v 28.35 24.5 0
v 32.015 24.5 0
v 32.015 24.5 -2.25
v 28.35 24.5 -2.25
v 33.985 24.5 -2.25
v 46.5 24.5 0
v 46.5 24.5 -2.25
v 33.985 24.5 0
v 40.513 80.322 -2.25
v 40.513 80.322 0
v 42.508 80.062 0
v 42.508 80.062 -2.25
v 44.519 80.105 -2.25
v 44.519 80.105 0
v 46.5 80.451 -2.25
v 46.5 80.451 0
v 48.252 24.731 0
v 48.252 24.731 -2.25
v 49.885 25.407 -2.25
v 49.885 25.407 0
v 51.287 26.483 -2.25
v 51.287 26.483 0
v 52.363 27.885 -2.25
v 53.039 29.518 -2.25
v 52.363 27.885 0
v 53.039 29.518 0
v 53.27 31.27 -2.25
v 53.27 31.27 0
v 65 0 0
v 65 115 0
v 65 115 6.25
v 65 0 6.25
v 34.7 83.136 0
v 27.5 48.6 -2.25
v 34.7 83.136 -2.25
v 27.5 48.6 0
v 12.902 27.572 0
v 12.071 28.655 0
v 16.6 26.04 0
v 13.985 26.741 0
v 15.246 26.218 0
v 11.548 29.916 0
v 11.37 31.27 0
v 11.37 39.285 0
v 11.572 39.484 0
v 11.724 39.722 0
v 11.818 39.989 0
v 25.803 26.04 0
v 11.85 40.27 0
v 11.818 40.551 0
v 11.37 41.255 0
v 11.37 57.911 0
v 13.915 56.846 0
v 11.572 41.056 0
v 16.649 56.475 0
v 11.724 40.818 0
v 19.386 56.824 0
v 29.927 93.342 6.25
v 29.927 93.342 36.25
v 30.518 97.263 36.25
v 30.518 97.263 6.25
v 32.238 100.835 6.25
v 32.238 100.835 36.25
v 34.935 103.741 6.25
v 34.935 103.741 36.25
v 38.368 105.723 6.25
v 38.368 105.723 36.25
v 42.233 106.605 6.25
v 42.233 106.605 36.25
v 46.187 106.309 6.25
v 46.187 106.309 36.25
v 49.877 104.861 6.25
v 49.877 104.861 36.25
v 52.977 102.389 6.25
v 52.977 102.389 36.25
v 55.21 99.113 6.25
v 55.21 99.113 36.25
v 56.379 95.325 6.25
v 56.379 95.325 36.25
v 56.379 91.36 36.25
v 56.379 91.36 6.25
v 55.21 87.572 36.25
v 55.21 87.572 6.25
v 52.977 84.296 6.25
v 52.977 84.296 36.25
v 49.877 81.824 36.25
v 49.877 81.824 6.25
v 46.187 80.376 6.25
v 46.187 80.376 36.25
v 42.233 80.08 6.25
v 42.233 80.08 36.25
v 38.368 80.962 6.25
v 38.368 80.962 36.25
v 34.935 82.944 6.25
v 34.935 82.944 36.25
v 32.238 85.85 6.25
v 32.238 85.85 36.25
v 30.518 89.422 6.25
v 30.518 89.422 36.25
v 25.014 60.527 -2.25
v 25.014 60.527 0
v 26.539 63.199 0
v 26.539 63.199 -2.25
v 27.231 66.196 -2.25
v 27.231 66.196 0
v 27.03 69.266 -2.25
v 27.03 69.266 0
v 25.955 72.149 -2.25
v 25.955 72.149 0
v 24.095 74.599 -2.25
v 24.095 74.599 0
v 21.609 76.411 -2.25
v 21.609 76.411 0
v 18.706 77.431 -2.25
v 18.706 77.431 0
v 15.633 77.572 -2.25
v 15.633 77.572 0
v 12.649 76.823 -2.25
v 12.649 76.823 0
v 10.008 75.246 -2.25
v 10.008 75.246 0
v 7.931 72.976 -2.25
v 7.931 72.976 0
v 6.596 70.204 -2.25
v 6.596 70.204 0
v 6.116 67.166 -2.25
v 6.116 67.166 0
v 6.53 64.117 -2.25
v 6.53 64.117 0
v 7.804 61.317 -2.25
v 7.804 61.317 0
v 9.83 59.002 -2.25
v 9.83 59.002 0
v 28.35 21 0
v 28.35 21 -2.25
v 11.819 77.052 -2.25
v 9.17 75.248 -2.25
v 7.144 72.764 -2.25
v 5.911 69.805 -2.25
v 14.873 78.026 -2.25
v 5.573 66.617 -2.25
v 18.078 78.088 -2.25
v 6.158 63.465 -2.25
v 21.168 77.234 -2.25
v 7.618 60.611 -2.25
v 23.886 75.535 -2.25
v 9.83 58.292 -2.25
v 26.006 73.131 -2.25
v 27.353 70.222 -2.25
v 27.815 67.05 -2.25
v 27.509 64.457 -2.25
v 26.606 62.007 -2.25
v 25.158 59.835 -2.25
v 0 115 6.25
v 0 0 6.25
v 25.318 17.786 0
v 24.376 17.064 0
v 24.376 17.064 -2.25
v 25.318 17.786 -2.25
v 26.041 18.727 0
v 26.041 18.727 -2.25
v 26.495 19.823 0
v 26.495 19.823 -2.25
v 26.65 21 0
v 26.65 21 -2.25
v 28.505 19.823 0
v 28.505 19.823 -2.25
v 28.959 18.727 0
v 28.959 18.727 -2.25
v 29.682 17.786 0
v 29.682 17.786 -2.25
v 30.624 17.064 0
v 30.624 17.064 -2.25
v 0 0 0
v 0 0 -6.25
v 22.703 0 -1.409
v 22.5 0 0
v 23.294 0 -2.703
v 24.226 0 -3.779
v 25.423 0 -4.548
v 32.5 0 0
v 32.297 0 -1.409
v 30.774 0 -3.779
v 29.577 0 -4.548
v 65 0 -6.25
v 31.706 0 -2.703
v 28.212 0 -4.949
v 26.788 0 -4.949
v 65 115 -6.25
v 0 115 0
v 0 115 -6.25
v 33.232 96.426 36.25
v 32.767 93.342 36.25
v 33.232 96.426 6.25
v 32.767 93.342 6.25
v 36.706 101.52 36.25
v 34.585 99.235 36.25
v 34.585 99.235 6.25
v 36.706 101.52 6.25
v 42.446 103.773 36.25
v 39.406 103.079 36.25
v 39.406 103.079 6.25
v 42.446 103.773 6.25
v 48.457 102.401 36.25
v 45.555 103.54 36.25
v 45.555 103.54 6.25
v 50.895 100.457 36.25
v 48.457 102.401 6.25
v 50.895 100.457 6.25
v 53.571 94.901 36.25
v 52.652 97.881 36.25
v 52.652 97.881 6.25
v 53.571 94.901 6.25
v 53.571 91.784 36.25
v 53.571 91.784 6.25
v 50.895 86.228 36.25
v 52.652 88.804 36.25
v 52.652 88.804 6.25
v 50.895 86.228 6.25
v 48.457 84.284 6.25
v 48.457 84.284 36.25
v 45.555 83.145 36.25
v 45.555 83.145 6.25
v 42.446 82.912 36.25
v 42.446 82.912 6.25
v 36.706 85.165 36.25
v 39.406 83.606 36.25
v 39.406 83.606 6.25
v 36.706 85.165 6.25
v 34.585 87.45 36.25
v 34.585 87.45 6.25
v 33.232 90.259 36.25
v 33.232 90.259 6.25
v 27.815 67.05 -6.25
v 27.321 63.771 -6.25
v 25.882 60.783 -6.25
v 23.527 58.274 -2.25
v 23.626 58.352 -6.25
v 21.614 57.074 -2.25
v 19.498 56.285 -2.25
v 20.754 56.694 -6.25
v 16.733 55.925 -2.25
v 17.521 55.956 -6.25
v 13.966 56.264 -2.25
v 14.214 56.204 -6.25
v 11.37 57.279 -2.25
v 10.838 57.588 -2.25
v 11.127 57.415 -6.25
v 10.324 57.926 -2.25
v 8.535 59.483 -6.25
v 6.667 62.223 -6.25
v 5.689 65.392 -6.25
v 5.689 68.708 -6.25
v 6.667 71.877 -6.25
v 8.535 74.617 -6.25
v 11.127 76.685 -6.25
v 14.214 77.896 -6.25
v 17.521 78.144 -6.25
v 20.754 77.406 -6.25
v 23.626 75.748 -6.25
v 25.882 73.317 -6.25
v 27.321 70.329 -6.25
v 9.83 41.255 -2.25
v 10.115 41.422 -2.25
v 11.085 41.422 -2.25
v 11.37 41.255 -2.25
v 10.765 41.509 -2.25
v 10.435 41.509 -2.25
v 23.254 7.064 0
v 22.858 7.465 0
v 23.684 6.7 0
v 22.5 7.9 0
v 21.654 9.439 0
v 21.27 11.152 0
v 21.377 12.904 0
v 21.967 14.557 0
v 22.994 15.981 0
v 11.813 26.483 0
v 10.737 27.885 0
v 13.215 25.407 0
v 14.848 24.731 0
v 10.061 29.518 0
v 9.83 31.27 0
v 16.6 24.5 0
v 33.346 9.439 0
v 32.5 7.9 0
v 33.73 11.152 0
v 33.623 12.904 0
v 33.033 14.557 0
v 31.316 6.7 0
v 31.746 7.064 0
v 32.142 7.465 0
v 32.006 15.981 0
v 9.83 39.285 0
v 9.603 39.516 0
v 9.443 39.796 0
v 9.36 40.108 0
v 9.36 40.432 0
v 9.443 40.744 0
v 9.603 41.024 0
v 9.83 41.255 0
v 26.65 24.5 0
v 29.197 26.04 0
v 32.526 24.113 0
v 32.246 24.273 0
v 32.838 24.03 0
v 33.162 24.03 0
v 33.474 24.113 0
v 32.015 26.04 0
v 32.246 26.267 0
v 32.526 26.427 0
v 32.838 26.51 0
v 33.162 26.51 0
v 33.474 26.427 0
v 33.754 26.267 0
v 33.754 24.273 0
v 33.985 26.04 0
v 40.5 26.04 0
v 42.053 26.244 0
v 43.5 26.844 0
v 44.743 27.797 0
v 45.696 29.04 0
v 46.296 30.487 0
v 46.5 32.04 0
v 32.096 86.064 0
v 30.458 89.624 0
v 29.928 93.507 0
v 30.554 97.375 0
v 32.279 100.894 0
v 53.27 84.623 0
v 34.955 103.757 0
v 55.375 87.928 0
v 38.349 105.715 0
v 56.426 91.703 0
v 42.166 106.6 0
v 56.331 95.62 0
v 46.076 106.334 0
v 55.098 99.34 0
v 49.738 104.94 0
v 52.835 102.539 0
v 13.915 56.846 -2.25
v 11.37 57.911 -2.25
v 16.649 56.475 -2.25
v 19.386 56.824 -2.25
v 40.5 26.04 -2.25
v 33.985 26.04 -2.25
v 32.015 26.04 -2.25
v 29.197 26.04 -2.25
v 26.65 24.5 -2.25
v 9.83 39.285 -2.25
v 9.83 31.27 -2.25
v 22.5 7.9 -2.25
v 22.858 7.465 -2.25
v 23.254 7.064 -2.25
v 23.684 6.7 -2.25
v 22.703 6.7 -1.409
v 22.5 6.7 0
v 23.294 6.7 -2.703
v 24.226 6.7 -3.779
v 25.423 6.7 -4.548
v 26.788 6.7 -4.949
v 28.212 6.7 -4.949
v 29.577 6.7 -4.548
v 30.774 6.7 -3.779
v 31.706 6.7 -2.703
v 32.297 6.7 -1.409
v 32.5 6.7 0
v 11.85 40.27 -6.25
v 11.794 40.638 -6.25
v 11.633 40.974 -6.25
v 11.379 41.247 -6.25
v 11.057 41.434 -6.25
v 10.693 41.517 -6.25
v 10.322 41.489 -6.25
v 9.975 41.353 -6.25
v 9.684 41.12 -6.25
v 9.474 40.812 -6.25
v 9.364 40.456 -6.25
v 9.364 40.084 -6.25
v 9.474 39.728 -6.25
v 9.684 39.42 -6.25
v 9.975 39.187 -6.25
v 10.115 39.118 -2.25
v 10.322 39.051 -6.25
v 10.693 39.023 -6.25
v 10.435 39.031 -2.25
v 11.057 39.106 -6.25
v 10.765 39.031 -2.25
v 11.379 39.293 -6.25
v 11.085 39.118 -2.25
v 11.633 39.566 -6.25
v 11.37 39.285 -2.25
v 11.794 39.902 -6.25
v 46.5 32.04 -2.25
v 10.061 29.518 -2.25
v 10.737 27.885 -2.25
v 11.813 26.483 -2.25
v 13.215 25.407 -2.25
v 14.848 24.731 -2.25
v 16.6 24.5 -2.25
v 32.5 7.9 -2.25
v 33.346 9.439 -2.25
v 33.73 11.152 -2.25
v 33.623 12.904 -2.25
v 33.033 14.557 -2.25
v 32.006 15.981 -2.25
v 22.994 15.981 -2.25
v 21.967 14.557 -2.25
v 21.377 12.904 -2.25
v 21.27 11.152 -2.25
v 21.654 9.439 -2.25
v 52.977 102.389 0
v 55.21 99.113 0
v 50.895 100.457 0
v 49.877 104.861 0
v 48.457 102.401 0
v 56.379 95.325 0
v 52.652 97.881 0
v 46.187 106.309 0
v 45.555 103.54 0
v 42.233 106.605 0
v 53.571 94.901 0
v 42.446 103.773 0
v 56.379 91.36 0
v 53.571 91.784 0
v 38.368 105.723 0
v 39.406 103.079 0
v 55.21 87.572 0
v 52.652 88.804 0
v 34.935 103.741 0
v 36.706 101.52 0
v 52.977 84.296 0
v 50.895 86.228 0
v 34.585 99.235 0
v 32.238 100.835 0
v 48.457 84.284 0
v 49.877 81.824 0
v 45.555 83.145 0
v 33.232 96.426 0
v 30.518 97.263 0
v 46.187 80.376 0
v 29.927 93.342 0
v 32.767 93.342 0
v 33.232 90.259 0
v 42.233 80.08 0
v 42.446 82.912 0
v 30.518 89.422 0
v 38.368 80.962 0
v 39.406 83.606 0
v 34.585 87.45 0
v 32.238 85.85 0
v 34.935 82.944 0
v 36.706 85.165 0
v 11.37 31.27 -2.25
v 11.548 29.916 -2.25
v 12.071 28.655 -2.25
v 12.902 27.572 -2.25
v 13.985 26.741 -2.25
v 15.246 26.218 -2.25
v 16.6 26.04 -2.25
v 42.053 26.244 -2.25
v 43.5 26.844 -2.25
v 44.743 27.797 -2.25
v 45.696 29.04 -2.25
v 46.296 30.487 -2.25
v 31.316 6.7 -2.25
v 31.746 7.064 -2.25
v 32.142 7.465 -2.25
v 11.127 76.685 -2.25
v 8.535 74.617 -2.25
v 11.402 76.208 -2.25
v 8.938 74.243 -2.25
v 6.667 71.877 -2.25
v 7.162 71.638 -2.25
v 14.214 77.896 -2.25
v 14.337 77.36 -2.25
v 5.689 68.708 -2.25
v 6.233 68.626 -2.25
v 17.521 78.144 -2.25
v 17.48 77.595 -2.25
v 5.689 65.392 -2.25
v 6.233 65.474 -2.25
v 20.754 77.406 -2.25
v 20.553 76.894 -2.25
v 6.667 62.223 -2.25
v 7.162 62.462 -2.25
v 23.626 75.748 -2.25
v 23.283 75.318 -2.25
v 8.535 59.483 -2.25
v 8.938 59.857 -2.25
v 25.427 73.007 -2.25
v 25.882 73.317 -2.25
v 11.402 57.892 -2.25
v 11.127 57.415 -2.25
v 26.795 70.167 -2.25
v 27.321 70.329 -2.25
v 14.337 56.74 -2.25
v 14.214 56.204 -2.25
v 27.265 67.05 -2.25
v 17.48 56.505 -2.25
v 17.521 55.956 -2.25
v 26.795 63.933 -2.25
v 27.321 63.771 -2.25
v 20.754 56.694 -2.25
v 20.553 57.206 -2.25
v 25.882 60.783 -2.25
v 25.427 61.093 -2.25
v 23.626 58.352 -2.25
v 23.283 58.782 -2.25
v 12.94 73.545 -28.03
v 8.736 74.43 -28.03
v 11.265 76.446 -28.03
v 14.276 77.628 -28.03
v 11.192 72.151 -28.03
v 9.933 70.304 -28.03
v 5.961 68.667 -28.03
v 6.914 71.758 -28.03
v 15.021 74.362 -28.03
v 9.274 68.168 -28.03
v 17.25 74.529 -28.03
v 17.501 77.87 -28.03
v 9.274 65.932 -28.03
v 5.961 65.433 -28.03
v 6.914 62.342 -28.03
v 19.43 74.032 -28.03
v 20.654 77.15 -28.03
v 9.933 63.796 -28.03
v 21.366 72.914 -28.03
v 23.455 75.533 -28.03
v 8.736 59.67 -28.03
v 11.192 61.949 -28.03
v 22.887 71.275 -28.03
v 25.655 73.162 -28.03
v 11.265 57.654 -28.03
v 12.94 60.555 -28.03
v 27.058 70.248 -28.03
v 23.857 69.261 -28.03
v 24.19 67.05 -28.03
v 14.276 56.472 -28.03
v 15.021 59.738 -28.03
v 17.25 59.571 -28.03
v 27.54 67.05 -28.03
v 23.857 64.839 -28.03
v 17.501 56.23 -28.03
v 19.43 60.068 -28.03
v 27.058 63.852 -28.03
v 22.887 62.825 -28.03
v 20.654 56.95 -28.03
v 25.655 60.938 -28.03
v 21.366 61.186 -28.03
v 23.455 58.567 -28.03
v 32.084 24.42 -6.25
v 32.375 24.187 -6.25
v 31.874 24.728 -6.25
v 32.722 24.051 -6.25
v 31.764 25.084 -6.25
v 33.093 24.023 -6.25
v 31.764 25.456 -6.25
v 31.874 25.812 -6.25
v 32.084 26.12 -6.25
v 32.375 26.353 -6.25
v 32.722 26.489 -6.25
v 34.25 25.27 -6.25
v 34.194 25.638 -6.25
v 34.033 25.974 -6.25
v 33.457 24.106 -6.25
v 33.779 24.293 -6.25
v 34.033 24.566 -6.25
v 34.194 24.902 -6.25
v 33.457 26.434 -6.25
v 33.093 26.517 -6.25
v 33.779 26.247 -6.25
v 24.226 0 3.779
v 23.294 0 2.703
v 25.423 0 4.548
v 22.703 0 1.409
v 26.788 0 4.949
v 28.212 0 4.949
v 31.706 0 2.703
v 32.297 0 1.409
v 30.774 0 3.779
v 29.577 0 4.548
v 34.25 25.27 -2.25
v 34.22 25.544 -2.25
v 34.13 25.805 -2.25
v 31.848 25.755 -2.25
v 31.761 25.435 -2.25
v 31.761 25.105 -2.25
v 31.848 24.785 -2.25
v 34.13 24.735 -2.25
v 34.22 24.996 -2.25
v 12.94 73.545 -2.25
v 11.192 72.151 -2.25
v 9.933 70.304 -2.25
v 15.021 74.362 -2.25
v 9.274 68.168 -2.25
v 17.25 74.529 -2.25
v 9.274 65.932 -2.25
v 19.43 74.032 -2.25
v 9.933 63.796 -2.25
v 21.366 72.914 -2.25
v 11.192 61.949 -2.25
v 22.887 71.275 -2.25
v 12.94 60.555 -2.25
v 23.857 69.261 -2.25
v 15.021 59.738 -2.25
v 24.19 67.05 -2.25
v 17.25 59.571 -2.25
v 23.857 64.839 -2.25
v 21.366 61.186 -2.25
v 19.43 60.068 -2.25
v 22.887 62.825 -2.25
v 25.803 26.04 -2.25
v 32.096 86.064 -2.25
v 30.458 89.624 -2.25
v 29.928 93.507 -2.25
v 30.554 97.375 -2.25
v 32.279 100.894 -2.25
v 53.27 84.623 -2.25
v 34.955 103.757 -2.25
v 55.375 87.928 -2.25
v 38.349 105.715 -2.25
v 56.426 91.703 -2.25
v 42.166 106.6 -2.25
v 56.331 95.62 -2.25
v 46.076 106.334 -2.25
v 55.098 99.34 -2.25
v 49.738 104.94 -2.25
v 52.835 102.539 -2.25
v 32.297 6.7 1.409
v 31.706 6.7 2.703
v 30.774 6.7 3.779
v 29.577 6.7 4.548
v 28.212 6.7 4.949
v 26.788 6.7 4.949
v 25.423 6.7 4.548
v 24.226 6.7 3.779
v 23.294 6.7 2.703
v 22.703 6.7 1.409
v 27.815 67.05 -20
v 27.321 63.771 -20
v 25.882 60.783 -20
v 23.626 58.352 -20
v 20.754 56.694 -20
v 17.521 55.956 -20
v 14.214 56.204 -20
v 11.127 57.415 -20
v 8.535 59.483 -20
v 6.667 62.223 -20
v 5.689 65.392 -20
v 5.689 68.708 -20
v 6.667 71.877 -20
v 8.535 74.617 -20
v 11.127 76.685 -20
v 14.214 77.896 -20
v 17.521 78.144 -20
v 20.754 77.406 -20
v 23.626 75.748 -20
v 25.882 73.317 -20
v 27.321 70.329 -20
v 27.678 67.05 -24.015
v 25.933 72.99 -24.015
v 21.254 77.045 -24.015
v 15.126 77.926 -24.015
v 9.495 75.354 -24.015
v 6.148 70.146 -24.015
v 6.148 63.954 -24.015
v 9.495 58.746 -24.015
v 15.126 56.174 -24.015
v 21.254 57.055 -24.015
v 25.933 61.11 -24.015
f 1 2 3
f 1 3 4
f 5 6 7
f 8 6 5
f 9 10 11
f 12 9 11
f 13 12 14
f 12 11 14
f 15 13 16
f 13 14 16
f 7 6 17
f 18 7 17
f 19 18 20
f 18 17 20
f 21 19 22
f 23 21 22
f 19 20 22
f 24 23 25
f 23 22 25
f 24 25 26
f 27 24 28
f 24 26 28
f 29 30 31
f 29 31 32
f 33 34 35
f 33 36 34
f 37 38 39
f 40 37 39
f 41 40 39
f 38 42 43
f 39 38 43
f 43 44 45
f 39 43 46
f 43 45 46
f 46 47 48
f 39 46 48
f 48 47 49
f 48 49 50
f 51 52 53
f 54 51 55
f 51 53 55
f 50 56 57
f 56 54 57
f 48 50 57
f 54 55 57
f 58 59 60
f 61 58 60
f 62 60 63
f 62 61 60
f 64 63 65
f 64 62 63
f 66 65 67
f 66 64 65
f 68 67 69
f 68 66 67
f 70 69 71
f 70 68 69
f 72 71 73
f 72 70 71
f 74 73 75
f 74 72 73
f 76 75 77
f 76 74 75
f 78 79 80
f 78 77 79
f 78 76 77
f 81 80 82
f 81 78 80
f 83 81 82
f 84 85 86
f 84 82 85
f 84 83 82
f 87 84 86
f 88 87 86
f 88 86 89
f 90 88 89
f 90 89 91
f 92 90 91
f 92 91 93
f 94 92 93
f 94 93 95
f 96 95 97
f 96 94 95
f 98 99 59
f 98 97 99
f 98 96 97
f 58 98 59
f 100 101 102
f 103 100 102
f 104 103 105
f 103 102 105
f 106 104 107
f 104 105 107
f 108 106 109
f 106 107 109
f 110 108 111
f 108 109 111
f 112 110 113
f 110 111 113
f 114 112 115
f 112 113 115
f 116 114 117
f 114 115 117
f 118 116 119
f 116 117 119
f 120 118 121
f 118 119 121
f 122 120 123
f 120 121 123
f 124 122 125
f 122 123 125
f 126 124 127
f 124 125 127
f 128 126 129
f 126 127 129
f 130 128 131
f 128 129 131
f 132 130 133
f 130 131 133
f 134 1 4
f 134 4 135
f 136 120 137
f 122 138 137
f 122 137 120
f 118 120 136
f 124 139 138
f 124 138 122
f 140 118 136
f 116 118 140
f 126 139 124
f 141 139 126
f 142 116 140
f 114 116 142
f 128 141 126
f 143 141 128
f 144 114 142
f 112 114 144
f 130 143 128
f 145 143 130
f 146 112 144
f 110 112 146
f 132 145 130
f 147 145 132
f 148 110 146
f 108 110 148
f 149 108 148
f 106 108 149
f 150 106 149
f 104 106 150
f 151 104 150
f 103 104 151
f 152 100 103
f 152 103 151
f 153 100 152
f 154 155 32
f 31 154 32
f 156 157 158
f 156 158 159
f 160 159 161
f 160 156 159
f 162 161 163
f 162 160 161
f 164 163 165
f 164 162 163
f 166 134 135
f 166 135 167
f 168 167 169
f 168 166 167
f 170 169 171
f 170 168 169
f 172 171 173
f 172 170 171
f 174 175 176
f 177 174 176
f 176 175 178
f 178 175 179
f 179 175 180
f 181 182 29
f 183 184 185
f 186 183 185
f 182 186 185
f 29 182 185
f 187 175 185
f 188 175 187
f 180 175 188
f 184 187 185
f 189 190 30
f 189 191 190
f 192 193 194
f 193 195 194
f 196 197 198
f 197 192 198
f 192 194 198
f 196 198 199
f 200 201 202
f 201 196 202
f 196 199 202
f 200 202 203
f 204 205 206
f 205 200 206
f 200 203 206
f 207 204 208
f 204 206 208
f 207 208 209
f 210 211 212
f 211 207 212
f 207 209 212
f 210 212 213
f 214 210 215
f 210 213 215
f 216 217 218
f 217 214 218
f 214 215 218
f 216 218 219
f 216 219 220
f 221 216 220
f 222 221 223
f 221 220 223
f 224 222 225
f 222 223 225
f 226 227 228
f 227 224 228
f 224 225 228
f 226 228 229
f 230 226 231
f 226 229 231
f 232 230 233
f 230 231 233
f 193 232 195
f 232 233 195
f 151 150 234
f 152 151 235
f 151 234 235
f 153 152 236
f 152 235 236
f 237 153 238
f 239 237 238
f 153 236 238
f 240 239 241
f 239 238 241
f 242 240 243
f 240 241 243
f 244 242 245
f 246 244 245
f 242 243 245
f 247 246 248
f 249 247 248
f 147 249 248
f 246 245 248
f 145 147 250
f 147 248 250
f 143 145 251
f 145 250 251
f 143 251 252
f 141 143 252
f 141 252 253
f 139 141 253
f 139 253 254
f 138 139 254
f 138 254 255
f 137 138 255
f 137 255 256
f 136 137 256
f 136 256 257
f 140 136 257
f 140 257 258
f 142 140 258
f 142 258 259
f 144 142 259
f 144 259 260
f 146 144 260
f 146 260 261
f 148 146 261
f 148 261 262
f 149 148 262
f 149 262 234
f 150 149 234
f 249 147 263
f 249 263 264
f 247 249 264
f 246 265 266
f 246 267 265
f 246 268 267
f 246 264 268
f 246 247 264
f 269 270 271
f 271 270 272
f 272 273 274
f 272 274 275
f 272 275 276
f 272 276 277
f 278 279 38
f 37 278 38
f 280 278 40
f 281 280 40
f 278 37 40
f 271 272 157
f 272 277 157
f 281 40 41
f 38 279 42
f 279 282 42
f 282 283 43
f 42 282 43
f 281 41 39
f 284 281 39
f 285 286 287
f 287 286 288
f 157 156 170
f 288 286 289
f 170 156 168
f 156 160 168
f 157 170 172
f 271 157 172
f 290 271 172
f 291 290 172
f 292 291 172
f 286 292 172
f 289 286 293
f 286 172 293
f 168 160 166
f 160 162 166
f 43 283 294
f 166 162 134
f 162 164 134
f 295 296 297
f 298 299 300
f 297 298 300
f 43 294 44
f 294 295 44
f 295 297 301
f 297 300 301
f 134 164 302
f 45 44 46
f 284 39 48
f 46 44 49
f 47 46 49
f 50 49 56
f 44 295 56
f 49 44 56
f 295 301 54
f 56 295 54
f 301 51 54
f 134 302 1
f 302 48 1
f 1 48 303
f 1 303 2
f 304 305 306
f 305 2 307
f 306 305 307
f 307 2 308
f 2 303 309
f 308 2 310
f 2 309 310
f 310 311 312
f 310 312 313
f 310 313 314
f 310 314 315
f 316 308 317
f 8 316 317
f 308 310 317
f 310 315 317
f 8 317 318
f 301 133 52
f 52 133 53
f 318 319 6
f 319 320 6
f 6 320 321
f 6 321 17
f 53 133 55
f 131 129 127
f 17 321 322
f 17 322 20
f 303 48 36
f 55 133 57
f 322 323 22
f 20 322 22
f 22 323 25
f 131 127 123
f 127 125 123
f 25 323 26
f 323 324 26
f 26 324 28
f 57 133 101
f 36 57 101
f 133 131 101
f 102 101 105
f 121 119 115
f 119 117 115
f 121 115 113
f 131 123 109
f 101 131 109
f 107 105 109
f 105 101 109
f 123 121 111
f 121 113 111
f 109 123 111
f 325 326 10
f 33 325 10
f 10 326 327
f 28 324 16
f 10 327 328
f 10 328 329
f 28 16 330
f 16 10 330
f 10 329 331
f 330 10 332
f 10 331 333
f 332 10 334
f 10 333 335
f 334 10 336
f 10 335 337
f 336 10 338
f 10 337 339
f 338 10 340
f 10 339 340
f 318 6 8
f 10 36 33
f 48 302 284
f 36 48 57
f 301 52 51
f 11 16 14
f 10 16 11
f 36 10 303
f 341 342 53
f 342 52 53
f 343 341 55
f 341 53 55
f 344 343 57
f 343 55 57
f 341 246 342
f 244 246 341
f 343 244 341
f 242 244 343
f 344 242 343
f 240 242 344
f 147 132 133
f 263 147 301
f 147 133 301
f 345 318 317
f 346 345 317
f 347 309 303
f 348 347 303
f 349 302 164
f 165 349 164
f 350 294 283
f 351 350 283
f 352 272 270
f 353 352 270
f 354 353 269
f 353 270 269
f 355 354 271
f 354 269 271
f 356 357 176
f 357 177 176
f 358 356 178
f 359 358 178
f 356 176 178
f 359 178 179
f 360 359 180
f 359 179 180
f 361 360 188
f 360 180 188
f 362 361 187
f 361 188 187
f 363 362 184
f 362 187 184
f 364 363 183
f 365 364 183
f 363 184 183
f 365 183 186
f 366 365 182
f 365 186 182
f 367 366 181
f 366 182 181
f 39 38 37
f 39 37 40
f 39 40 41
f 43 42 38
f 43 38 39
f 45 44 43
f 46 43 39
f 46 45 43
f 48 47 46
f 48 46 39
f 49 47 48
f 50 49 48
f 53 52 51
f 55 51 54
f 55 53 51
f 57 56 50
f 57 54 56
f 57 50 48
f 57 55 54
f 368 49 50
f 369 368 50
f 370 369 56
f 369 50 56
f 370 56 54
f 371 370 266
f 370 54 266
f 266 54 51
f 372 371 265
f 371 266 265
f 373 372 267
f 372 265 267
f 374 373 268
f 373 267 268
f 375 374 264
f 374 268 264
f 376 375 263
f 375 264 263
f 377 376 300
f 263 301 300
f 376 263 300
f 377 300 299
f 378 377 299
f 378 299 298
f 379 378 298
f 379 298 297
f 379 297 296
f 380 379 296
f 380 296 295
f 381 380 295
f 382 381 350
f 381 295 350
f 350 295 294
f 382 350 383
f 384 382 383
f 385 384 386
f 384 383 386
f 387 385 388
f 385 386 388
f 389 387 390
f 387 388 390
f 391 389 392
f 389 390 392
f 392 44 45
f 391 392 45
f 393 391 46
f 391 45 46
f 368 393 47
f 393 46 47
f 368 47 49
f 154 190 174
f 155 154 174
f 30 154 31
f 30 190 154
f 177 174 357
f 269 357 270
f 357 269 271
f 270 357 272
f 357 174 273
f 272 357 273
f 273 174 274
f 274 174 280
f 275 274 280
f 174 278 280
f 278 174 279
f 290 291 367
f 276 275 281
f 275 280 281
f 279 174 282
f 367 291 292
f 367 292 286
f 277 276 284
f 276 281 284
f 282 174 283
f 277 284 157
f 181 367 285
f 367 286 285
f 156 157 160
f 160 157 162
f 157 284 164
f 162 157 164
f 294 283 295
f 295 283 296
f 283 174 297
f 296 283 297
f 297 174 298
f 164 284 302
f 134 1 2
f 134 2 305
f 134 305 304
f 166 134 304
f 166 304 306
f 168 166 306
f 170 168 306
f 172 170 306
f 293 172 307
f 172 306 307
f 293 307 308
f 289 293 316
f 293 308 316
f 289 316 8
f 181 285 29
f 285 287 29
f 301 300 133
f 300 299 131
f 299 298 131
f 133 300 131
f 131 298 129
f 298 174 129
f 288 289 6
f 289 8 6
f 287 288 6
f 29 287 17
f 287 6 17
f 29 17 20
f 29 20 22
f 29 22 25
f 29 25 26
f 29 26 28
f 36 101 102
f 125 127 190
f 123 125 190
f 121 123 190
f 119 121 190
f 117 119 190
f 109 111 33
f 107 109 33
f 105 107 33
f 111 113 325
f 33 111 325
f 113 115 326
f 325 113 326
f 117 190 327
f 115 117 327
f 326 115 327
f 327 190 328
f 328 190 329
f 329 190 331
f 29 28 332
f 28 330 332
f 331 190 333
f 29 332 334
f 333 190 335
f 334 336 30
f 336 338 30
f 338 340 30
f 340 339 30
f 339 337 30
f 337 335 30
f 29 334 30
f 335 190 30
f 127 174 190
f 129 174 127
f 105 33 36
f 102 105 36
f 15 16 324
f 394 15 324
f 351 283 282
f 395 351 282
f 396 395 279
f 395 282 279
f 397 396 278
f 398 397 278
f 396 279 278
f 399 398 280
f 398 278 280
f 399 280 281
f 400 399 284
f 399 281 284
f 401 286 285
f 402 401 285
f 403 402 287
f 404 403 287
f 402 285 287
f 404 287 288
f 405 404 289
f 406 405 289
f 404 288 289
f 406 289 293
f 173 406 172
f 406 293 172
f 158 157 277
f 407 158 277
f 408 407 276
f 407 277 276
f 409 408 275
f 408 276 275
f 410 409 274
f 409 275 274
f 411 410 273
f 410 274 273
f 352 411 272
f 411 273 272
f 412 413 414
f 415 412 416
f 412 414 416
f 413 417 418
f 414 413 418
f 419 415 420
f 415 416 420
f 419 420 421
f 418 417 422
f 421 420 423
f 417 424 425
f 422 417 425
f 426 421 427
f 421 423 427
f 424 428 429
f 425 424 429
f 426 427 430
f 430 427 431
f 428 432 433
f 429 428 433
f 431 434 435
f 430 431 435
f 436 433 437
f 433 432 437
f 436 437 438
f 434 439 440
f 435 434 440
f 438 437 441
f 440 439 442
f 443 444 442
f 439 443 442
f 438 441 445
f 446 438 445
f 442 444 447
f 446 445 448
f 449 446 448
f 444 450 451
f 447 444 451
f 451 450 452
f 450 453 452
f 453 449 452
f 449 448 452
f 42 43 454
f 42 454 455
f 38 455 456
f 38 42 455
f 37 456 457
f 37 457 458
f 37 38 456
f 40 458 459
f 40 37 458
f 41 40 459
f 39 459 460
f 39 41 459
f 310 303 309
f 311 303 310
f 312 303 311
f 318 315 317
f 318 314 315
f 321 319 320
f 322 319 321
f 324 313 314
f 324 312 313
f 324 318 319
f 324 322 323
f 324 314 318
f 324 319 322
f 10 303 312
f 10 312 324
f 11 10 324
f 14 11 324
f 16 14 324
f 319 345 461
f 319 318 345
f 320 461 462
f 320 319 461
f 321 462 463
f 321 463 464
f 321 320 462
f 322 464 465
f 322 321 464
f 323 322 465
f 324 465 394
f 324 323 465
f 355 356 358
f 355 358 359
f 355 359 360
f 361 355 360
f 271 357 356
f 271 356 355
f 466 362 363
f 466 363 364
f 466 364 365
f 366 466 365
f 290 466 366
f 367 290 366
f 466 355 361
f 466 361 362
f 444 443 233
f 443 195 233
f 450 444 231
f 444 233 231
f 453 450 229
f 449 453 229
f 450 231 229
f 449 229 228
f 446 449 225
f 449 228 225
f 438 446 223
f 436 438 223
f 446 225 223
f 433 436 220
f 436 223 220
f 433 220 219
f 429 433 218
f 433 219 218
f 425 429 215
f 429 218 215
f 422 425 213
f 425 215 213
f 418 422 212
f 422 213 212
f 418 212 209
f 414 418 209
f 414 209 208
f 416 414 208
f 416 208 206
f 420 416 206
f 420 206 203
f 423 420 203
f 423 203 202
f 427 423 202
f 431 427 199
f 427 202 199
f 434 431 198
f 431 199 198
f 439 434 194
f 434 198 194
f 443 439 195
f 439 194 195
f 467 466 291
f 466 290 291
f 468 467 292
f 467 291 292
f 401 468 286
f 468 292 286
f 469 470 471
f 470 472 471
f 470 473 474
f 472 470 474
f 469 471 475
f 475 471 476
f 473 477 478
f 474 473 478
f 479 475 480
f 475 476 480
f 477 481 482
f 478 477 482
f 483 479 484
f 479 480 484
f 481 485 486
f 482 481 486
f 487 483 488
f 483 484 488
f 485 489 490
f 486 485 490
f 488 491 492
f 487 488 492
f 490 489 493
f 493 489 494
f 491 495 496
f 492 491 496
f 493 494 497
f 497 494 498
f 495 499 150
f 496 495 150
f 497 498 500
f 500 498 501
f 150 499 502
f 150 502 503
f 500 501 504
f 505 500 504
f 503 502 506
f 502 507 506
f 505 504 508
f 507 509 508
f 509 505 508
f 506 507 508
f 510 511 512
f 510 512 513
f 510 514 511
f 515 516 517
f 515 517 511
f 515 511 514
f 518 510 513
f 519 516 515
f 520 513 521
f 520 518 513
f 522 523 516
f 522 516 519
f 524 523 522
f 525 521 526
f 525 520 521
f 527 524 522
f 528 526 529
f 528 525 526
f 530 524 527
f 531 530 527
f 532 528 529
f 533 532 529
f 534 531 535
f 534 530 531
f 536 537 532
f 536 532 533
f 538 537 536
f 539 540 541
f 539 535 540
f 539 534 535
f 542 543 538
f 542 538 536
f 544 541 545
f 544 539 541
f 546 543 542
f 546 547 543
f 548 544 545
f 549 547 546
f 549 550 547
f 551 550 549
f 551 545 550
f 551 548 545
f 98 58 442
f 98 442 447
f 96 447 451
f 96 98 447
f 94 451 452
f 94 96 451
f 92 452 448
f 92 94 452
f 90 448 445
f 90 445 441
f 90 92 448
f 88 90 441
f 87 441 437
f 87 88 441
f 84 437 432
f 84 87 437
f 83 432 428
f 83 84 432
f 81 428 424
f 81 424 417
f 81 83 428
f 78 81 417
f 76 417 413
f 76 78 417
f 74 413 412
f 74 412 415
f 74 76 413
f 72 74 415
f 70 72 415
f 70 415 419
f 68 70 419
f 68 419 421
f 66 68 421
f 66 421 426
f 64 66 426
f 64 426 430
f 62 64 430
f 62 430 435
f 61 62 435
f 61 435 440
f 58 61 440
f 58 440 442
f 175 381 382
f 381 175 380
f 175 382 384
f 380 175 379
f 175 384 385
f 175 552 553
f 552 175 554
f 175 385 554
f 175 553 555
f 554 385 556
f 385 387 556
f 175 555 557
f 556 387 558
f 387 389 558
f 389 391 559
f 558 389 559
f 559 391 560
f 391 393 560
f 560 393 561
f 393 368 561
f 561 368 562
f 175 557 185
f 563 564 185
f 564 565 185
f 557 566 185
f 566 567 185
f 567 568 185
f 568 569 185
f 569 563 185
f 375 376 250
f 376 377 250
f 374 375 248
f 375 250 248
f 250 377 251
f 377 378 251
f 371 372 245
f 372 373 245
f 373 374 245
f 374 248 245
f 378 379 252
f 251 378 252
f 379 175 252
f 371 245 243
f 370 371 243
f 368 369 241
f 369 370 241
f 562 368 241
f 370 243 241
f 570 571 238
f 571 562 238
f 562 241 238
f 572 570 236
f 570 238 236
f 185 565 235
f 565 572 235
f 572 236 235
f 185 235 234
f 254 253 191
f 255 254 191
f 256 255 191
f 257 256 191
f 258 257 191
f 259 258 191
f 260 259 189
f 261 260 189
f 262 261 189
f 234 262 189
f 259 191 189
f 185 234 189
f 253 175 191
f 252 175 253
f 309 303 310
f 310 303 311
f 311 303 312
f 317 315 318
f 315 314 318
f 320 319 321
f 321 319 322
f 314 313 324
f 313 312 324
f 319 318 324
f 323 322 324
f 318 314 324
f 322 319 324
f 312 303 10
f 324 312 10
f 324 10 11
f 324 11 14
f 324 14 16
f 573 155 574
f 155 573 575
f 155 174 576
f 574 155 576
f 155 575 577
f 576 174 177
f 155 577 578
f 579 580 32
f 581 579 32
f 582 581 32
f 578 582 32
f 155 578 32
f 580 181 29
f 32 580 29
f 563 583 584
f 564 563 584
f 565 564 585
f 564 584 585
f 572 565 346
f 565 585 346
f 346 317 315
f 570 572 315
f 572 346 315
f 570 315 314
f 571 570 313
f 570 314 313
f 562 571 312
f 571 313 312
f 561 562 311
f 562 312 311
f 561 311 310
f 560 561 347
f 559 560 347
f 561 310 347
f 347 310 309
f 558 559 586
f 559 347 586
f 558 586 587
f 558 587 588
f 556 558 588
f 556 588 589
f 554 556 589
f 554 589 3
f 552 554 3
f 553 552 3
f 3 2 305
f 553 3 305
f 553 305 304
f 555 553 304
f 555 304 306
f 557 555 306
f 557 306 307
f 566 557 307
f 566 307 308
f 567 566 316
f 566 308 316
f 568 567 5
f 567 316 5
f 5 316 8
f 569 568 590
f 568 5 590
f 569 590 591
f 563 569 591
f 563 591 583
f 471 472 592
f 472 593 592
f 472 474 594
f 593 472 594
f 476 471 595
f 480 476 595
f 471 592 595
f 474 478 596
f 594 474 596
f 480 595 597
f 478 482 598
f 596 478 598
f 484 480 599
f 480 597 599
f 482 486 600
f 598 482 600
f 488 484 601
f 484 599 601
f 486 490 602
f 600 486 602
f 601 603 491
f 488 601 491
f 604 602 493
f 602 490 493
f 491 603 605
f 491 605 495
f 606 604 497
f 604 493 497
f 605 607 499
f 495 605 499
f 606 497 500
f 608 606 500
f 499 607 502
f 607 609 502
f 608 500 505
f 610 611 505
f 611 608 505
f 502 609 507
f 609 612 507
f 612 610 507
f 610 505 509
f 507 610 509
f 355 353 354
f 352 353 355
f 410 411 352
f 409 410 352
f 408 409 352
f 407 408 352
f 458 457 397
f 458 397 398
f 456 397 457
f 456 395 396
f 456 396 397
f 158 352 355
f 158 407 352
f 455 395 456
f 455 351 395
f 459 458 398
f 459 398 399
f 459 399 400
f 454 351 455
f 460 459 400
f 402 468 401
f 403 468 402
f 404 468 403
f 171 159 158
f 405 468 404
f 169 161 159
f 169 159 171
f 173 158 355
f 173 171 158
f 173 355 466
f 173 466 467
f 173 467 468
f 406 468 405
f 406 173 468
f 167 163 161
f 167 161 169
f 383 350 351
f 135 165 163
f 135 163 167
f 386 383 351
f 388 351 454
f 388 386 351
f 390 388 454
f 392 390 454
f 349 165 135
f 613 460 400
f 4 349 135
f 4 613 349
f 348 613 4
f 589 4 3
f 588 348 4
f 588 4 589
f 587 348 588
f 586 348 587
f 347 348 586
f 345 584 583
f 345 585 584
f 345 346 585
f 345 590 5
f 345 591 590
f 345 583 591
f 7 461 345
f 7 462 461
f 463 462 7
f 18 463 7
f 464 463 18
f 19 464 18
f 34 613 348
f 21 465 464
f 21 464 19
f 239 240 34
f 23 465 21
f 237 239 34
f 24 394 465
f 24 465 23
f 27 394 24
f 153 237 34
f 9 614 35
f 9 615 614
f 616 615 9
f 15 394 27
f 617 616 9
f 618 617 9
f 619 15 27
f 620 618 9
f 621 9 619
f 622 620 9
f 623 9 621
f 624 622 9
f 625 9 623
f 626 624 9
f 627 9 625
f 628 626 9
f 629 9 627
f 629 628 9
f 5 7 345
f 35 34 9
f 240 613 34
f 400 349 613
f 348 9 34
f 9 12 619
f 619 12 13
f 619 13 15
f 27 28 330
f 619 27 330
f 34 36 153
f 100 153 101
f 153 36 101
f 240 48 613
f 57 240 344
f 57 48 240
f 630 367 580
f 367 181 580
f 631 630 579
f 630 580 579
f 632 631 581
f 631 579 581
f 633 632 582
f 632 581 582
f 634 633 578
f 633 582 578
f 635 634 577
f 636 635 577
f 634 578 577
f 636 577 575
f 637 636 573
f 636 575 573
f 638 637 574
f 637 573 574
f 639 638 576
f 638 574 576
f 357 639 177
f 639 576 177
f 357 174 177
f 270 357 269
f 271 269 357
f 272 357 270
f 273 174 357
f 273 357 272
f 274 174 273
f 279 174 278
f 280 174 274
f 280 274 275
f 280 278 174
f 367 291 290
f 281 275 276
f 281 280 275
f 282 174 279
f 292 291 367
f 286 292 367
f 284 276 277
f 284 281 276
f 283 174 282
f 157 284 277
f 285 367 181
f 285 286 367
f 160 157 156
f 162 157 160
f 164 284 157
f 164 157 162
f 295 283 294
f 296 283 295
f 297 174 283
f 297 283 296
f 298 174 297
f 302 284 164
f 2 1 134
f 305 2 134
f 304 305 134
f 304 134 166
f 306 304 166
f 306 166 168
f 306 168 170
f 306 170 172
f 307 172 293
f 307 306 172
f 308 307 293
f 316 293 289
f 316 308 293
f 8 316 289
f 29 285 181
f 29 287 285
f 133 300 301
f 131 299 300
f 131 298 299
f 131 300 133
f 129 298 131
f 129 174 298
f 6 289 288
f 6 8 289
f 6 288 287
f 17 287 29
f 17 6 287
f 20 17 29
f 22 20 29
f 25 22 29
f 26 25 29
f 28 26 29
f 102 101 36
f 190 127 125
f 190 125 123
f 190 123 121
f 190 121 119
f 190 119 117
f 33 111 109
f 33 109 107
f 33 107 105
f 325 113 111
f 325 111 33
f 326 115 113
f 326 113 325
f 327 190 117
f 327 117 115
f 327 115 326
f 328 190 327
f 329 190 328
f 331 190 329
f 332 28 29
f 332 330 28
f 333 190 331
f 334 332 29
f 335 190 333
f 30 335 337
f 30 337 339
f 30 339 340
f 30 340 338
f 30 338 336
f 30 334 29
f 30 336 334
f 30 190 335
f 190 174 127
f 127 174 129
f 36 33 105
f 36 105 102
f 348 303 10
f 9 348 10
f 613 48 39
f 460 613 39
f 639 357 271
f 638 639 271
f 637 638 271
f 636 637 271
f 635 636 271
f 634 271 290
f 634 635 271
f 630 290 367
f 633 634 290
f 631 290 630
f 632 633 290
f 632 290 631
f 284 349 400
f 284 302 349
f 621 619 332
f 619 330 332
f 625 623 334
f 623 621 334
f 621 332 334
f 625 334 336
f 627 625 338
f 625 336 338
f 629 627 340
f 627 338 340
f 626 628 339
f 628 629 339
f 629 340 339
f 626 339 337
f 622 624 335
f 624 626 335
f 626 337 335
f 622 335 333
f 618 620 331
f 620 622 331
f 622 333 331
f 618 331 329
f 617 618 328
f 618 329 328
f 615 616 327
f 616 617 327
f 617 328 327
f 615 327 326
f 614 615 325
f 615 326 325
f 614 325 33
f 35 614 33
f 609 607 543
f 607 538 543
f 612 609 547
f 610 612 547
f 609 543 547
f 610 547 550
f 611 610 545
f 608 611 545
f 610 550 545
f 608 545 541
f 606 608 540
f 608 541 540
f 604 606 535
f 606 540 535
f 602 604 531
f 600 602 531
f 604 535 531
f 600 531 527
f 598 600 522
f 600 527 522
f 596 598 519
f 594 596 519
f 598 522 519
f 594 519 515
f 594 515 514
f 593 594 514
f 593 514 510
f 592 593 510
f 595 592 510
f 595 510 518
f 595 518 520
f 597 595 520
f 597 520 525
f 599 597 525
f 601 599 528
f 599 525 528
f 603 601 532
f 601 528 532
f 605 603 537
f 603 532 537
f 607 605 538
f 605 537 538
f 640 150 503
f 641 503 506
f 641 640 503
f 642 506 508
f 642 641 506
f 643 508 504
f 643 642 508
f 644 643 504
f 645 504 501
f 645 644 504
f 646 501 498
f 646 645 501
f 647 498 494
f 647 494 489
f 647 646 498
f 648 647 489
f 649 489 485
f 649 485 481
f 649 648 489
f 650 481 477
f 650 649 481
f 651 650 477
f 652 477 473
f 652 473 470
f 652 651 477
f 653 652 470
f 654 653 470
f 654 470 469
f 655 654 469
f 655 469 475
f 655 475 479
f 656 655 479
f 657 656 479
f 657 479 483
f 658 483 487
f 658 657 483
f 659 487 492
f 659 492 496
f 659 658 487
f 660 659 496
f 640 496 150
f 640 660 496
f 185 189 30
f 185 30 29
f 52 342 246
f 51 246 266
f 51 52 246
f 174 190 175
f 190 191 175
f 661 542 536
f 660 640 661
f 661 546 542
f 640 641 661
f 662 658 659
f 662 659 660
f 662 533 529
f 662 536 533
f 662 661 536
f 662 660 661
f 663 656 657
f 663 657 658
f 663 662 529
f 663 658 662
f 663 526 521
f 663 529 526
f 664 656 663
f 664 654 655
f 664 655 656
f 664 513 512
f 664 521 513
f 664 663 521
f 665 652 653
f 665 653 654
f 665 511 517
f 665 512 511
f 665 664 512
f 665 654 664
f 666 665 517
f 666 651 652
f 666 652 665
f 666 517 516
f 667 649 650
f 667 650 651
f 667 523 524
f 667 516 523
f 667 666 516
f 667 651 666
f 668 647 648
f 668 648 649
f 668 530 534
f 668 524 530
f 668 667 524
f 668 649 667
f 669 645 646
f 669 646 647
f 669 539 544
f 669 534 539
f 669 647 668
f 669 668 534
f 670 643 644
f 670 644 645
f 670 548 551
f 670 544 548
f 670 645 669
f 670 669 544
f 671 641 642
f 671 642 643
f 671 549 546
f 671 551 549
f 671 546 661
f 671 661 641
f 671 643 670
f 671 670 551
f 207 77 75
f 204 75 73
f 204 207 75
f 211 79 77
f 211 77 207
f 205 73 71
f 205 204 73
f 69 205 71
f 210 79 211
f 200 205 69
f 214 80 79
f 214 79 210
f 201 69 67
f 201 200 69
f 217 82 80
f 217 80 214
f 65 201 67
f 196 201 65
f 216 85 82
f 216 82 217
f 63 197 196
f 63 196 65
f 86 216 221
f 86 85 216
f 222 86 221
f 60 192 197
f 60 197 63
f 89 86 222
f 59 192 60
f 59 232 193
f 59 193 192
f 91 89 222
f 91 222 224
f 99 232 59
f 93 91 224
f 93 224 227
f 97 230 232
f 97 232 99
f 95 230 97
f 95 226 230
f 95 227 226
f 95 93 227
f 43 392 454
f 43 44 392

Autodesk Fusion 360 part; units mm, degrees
sketch "Channels" plane through (0, 0, 0) normal (0, 0, 1) x (1, 0, 0)
  line L0 (0, 0) -> (46.5, 0)
  line L1 (46.5, 0) -> (46.5, 83) construction
  line L2 (46.5, 83) -> (0, 83) construction
  line L3 (0, 83) -> (0, 0)
  line L4 (27.5, -7) -> (27.5, 90) construction
  line L5 (10.6, 83) -> (10.6, 31.27) construction
  line L6 (46.5, 25.27) -> (16.6, 25.27) construction
  arc A0 (10.6, 31.27) -> (16.6, 25.27) centre (16.6, 31.27) ccw construction
  arc A1 (9.83, 31.27) -> (16.6, 24.5) centre (16.6, 31.27) ccw
  arc A2 (11.37, 31.27) -> (16.6, 26.04) centre (16.6, 31.27) ccw
  line L7 (27.5, 48.6) -> (34.6997, 83.1362)
  line L8 (27.5, 48.6) -> (46.5, 48.6) construction
  line L9 (27.5, 48.6) -> (25.0136, 60.5271)
  line L10 (25.8031, 26.04) -> (19.3855, 56.8243)
  line L11 (27.5, 17.9) -> (28.8759, 24.5) construction
  line L12 (29.1969, 26.04) -> (33.9, 48.6) construction
  line L13 (28.35, 24.5) -> (28.35, 21)
  line L14 (26.65, 24.5) -> (26.65, 21)
  arc A3 (28.35, 21) -> (30.6235, 17.0635) centre (32.8947, 21) ccw
  arc A4 (24.3765, 17.0635) -> (26.65, 21) centre (22.1053, 21) ccw
  line L15 (40.5, 26.04) -> (29.1969, 26.04)
  line L16 (25.8031, 26.04) -> (16.6, 26.04)
  line L17 (46.5, 24.5) -> (28.35, 24.5)
  line L18 (26.65, 24.5) -> (16.6, 24.5)
  line L19 (11.37, 57.9106) -> (11.37, 31.27)
  line L20 (9.83, 59.002) -> (9.83, 31.27)
  arc A5 (25.0136, 60.5271) -> (9.83, 59.002) centre (16.69, 67.05) ccw
  arc A6 (11.37, 57.9106) -> (19.3855, 56.8243) centre (16.69, 67.05) ccw
  circle A7 centre (16.69, 67.05) radius 7.5 construction
  line L21 (32.5, 0) -> (32.5, 7.9)
  line L22 (22.5, 0) -> (22.5, 7.9)
  arc A8 (24.3766, 17.0636) -> (22.5, 7.9) centre (27.5, 11.65) ccw
  arc A9 (22.5, 7.9) -> (27.5, 5.4) centre (27.5, 11.65) ccw construction
  arc A10 (27.5, 5.4) -> (32.5, 7.9) centre (27.5, 11.65) ccw construction
  arc A11 (32.5, 7.9) -> (30.6235, 17.0635) centre (27.5, 11.65) ccw
  line L23 (29.1969, 26.04) -> (40.5131, 80.3225)
  line L24 (40.5131, 80.3225) -> (44.213, 98.0704) construction
  line L25 (34.6997, 83.1362) -> (34.6713, 83) construction
  arc A12 (30.6235, 17.0635) -> (27.5, 17.9) centre (27.5, 11.65) ccw construction
  arc A13 (24.3765, 17.0635) -> (30.6235, 17.0635) centre (27.5, 11.65) ccw
  arc A14 (27.5, 17.9) -> (24.3765, 17.0635) centre (27.5, 11.65) ccw construction
  circle A15 centre (16.69, 67.05) radius 11.125 construction
  circle A16 centre (43.2274, 93.3425) radius 13.3
  line L26 (52.5, 83.8079) -> (52.5, 31.27) construction
  arc A17 (46.5, 25.27) -> (52.5, 31.27) centre (46.5, 31.27) ccw construction
  line L27 (53.27, 31.27) -> (53.27, 84.6226)
  arc A18 (46.5, 24.5) -> (53.27, 31.27) centre (46.5, 31.27) ccw
  line L28 (0, 83) -> (0, 115)
  line L29 (0, 115) -> (65, 115)
  line L30 (65, 115) -> (65, 0)
  line L31 (65, 0) -> (46.5, 0)
  line L32 (46.5, 80.4514) -> (46.5, 32.04)
  arc A19 (40.5, 26.04) -> (46.5, 32.04) centre (40.5, 32.04) ccw
  dimension "d1" = 83
  dimension "d2" = 46.5
  dimension "d6" = 6
  dimension "d7" = 10.6
  dimension "d8" = 25.27
  dimension "d11" = 12.5
  dimension "d12" = 12.85
  dimension "d13" = 34.4
  dimension "d14" = 12.6
  dimension "d16" = 3.3939
  dimension "d17" = 0.85
  dimension "d20" = 21.15
  dimension "d21" = 16.69
  dimension "d22" = 15.95
  dimension "d23" = 0.77
  dimension "d24" = 0.77
  dimension "d25" = 11.776
  dimension "d26" = 15
  dimension "d27" = 5
  dimension "d34" = 1.54
  dimension "d35" = 1.7
  dimension "d36" = 6.2653
  dimension "d38" = 3.5
  dimension "d65" = 22.25
  dimension "d78" = 26.6
  dimension "d81" = 27.5
  dimension "d82" = 6
  dimension "d84" = 0.77
  dimension "d87" = 115
  dimension "d94" = 6
sketch "Set screws" plane through (0, 0, 0) normal (0, 0, 1) x (1, 0, 0)
  line L0 (46.5, 25.27) -> (16.6, 25.27) construction
  line L1 (27.5, -7) -> (27.5, 90) construction
  arc A0 (10.6, 31.27) -> (16.6, 25.27) centre (16.6, 31.27) ccw construction
  line L2 (10.6, 83) -> (10.6, 31.27) construction
  circle A1 centre (33, 25.27) radius 1.25
  circle A2 centre (10.6, 40.27) radius 1.25
  dimension "d61" = 2.5
  dimension "d62" = 2.5
  dimension "d63" = 5.5
  dimension "d64" = 15
extrude "Extrude1" add sketch "Channels" along normal blind 6.25 and the other way blind 6.25 contours L0 L3 A1 L7 L9 L13 L14 A3 A4 L17 L18 L20 A5 L21 L22 A8 A11 A13 A16 L27 A18 L28 L29 L30 L31 | L0 L21 L22 A13 | A1 L7 L9 L13 L14 A3 A4 L15 L17 L18 L20 A5 A8 A11 L23 A13 A16 L27 A18 L32 A19 | A16 | L15 L23 A16 L32 A19 | A2 L10 L16 L19 A6 makes body 1
extrude "Extrude2" cut sketch "Channels" against normal blind 2.25 contours A1 L7 L9 L13 L14 A3 A4 L15 L17 L18 L20 A5 A8 A11 L23 A13 A16 L27 A18 L32 A19 | A16 bodies 1
extrude "Extrude9" cut sketch "Set screws" against normal through all bodies 1
ref_plane "WorkPlane1" through (0, 67.05, 0) normal (0, 1, 0) x (0, 0, 1)
sketch "Outlet" plane through (0, 67.05, 0) normal (0, 1, 0) x (1, 0, 0)
  line L0 (27.265, 0) -> (27.265, 2.25)
  line L1 (27.265, 2.25) -> (27.815, 2.25)
  line L2 (27.815, 2.25) -> (27.815, 20)
  line L3 (27.815, 20) -> (27.54, 28.03)
  line L4 (24.19, 0) -> (24.19, 28.03)
  line L5 (24.19, 28.03) -> (27.54, 28.03)
  line L6 (27.265, 2.25) -> (24.19, 2.25)
  line L7 (27.265, 0) -> (24.19, 0)
  line L8 (16.69, 0) -> (16.69, 56) construction
  line L9 (24.19, 0) -> (16.69, 0)
  line L10 (24.19, 28.03) -> (16.69, 28)
  line L11 (16.69, 0) -> (16.69, 28)
  point P0 (9.19, 0)
  point P1 (24.19, 0)
  point P2 (27.265, 0)
  point P3 (6.115, 0)
  point P4 (5.565, 0)
  point P5 (27.815, 0)
  point P6 (16.69, 0)
  dimension "d67" = 17.75
  dimension "d68" = 25.78
  dimension "d69" = 7.5
  dimension "d70" = 11.125
  dimension "d71" = 2.25
  dimension "d74" = 10.85
revolve "Revolve1" cut sketch "Outlet" angle 360 about axis through (16.69, 67.05, 0) along (0, 0, -1) bodies 1
revolve "Revolve2" add sketch "Outlet" angle 360 about axis through (16.69, 67.05, 0) along (0, 0, -1) separate body contours L1 L2 L3 L4 L5 L6 makes body 2
sketch "Inlet" plane through (0, 0, 0) normal (0, -1, 0) x (1, 0, 0)
  line L0 (65, 6.25) -> (0, 6.25)
  line L1 (0, 6.25) -> (0, -6.25)
  line L2 (0, -6.25) -> (65, -6.25)
  circle A0 centre (27.5, 0) radius 5
  line L3 (65, -6.25) -> (65, 6.25)
  point P0 (27.5, 0)
  point P1 (22.5, 0)
extrude "Extrude5" cut sketch "Inlet" against normal blind 6.7 contours A0 bodies 1
split "Split1" by plane through (0, 0, 0) normal (0, 0, 1) bodies 1 makes body 3 at (21.6667, 76.6667, 6.25)
sketch "Sketch7" plane through (0, 0, 6.25) normal (0, 0, 1) x (-1, 0, 0)
  line L0 (0, -115) -> (0, 0)
  line L1 (0, 0) -> (-65, 0)
  line L2 (-65, 0) -> (-65, -115)
  line L3 (-65, -115) -> (0, -115)
  circle A0 centre (-43.2274, -93.3425) radius 13.3 construction
  circle A1 centre (-43.2274, -93.3425) radius 10.46
  circle A2 centre (-43.2274, -93.3425) radius 13.3
  dimension "d85" = 20.92
  dimension "d95" = 26.6
extrude "Extrude10" cut sketch "Sketch7" against normal up to surface (6.25 mm away) contours A1 | A2 bodies 1
extrude "Extrude11" add sketch "Sketch7" along normal blind 30 and the other way up to surface (6.25 mm away) separate body contours A2 makes body 4
thread "Thread1"
equation "d12 = ( 12.5 / 2 ) * 1 mm + 6.60 mm"
equation "d74 = ( 21.7 / 2 ) * 1 mm"
